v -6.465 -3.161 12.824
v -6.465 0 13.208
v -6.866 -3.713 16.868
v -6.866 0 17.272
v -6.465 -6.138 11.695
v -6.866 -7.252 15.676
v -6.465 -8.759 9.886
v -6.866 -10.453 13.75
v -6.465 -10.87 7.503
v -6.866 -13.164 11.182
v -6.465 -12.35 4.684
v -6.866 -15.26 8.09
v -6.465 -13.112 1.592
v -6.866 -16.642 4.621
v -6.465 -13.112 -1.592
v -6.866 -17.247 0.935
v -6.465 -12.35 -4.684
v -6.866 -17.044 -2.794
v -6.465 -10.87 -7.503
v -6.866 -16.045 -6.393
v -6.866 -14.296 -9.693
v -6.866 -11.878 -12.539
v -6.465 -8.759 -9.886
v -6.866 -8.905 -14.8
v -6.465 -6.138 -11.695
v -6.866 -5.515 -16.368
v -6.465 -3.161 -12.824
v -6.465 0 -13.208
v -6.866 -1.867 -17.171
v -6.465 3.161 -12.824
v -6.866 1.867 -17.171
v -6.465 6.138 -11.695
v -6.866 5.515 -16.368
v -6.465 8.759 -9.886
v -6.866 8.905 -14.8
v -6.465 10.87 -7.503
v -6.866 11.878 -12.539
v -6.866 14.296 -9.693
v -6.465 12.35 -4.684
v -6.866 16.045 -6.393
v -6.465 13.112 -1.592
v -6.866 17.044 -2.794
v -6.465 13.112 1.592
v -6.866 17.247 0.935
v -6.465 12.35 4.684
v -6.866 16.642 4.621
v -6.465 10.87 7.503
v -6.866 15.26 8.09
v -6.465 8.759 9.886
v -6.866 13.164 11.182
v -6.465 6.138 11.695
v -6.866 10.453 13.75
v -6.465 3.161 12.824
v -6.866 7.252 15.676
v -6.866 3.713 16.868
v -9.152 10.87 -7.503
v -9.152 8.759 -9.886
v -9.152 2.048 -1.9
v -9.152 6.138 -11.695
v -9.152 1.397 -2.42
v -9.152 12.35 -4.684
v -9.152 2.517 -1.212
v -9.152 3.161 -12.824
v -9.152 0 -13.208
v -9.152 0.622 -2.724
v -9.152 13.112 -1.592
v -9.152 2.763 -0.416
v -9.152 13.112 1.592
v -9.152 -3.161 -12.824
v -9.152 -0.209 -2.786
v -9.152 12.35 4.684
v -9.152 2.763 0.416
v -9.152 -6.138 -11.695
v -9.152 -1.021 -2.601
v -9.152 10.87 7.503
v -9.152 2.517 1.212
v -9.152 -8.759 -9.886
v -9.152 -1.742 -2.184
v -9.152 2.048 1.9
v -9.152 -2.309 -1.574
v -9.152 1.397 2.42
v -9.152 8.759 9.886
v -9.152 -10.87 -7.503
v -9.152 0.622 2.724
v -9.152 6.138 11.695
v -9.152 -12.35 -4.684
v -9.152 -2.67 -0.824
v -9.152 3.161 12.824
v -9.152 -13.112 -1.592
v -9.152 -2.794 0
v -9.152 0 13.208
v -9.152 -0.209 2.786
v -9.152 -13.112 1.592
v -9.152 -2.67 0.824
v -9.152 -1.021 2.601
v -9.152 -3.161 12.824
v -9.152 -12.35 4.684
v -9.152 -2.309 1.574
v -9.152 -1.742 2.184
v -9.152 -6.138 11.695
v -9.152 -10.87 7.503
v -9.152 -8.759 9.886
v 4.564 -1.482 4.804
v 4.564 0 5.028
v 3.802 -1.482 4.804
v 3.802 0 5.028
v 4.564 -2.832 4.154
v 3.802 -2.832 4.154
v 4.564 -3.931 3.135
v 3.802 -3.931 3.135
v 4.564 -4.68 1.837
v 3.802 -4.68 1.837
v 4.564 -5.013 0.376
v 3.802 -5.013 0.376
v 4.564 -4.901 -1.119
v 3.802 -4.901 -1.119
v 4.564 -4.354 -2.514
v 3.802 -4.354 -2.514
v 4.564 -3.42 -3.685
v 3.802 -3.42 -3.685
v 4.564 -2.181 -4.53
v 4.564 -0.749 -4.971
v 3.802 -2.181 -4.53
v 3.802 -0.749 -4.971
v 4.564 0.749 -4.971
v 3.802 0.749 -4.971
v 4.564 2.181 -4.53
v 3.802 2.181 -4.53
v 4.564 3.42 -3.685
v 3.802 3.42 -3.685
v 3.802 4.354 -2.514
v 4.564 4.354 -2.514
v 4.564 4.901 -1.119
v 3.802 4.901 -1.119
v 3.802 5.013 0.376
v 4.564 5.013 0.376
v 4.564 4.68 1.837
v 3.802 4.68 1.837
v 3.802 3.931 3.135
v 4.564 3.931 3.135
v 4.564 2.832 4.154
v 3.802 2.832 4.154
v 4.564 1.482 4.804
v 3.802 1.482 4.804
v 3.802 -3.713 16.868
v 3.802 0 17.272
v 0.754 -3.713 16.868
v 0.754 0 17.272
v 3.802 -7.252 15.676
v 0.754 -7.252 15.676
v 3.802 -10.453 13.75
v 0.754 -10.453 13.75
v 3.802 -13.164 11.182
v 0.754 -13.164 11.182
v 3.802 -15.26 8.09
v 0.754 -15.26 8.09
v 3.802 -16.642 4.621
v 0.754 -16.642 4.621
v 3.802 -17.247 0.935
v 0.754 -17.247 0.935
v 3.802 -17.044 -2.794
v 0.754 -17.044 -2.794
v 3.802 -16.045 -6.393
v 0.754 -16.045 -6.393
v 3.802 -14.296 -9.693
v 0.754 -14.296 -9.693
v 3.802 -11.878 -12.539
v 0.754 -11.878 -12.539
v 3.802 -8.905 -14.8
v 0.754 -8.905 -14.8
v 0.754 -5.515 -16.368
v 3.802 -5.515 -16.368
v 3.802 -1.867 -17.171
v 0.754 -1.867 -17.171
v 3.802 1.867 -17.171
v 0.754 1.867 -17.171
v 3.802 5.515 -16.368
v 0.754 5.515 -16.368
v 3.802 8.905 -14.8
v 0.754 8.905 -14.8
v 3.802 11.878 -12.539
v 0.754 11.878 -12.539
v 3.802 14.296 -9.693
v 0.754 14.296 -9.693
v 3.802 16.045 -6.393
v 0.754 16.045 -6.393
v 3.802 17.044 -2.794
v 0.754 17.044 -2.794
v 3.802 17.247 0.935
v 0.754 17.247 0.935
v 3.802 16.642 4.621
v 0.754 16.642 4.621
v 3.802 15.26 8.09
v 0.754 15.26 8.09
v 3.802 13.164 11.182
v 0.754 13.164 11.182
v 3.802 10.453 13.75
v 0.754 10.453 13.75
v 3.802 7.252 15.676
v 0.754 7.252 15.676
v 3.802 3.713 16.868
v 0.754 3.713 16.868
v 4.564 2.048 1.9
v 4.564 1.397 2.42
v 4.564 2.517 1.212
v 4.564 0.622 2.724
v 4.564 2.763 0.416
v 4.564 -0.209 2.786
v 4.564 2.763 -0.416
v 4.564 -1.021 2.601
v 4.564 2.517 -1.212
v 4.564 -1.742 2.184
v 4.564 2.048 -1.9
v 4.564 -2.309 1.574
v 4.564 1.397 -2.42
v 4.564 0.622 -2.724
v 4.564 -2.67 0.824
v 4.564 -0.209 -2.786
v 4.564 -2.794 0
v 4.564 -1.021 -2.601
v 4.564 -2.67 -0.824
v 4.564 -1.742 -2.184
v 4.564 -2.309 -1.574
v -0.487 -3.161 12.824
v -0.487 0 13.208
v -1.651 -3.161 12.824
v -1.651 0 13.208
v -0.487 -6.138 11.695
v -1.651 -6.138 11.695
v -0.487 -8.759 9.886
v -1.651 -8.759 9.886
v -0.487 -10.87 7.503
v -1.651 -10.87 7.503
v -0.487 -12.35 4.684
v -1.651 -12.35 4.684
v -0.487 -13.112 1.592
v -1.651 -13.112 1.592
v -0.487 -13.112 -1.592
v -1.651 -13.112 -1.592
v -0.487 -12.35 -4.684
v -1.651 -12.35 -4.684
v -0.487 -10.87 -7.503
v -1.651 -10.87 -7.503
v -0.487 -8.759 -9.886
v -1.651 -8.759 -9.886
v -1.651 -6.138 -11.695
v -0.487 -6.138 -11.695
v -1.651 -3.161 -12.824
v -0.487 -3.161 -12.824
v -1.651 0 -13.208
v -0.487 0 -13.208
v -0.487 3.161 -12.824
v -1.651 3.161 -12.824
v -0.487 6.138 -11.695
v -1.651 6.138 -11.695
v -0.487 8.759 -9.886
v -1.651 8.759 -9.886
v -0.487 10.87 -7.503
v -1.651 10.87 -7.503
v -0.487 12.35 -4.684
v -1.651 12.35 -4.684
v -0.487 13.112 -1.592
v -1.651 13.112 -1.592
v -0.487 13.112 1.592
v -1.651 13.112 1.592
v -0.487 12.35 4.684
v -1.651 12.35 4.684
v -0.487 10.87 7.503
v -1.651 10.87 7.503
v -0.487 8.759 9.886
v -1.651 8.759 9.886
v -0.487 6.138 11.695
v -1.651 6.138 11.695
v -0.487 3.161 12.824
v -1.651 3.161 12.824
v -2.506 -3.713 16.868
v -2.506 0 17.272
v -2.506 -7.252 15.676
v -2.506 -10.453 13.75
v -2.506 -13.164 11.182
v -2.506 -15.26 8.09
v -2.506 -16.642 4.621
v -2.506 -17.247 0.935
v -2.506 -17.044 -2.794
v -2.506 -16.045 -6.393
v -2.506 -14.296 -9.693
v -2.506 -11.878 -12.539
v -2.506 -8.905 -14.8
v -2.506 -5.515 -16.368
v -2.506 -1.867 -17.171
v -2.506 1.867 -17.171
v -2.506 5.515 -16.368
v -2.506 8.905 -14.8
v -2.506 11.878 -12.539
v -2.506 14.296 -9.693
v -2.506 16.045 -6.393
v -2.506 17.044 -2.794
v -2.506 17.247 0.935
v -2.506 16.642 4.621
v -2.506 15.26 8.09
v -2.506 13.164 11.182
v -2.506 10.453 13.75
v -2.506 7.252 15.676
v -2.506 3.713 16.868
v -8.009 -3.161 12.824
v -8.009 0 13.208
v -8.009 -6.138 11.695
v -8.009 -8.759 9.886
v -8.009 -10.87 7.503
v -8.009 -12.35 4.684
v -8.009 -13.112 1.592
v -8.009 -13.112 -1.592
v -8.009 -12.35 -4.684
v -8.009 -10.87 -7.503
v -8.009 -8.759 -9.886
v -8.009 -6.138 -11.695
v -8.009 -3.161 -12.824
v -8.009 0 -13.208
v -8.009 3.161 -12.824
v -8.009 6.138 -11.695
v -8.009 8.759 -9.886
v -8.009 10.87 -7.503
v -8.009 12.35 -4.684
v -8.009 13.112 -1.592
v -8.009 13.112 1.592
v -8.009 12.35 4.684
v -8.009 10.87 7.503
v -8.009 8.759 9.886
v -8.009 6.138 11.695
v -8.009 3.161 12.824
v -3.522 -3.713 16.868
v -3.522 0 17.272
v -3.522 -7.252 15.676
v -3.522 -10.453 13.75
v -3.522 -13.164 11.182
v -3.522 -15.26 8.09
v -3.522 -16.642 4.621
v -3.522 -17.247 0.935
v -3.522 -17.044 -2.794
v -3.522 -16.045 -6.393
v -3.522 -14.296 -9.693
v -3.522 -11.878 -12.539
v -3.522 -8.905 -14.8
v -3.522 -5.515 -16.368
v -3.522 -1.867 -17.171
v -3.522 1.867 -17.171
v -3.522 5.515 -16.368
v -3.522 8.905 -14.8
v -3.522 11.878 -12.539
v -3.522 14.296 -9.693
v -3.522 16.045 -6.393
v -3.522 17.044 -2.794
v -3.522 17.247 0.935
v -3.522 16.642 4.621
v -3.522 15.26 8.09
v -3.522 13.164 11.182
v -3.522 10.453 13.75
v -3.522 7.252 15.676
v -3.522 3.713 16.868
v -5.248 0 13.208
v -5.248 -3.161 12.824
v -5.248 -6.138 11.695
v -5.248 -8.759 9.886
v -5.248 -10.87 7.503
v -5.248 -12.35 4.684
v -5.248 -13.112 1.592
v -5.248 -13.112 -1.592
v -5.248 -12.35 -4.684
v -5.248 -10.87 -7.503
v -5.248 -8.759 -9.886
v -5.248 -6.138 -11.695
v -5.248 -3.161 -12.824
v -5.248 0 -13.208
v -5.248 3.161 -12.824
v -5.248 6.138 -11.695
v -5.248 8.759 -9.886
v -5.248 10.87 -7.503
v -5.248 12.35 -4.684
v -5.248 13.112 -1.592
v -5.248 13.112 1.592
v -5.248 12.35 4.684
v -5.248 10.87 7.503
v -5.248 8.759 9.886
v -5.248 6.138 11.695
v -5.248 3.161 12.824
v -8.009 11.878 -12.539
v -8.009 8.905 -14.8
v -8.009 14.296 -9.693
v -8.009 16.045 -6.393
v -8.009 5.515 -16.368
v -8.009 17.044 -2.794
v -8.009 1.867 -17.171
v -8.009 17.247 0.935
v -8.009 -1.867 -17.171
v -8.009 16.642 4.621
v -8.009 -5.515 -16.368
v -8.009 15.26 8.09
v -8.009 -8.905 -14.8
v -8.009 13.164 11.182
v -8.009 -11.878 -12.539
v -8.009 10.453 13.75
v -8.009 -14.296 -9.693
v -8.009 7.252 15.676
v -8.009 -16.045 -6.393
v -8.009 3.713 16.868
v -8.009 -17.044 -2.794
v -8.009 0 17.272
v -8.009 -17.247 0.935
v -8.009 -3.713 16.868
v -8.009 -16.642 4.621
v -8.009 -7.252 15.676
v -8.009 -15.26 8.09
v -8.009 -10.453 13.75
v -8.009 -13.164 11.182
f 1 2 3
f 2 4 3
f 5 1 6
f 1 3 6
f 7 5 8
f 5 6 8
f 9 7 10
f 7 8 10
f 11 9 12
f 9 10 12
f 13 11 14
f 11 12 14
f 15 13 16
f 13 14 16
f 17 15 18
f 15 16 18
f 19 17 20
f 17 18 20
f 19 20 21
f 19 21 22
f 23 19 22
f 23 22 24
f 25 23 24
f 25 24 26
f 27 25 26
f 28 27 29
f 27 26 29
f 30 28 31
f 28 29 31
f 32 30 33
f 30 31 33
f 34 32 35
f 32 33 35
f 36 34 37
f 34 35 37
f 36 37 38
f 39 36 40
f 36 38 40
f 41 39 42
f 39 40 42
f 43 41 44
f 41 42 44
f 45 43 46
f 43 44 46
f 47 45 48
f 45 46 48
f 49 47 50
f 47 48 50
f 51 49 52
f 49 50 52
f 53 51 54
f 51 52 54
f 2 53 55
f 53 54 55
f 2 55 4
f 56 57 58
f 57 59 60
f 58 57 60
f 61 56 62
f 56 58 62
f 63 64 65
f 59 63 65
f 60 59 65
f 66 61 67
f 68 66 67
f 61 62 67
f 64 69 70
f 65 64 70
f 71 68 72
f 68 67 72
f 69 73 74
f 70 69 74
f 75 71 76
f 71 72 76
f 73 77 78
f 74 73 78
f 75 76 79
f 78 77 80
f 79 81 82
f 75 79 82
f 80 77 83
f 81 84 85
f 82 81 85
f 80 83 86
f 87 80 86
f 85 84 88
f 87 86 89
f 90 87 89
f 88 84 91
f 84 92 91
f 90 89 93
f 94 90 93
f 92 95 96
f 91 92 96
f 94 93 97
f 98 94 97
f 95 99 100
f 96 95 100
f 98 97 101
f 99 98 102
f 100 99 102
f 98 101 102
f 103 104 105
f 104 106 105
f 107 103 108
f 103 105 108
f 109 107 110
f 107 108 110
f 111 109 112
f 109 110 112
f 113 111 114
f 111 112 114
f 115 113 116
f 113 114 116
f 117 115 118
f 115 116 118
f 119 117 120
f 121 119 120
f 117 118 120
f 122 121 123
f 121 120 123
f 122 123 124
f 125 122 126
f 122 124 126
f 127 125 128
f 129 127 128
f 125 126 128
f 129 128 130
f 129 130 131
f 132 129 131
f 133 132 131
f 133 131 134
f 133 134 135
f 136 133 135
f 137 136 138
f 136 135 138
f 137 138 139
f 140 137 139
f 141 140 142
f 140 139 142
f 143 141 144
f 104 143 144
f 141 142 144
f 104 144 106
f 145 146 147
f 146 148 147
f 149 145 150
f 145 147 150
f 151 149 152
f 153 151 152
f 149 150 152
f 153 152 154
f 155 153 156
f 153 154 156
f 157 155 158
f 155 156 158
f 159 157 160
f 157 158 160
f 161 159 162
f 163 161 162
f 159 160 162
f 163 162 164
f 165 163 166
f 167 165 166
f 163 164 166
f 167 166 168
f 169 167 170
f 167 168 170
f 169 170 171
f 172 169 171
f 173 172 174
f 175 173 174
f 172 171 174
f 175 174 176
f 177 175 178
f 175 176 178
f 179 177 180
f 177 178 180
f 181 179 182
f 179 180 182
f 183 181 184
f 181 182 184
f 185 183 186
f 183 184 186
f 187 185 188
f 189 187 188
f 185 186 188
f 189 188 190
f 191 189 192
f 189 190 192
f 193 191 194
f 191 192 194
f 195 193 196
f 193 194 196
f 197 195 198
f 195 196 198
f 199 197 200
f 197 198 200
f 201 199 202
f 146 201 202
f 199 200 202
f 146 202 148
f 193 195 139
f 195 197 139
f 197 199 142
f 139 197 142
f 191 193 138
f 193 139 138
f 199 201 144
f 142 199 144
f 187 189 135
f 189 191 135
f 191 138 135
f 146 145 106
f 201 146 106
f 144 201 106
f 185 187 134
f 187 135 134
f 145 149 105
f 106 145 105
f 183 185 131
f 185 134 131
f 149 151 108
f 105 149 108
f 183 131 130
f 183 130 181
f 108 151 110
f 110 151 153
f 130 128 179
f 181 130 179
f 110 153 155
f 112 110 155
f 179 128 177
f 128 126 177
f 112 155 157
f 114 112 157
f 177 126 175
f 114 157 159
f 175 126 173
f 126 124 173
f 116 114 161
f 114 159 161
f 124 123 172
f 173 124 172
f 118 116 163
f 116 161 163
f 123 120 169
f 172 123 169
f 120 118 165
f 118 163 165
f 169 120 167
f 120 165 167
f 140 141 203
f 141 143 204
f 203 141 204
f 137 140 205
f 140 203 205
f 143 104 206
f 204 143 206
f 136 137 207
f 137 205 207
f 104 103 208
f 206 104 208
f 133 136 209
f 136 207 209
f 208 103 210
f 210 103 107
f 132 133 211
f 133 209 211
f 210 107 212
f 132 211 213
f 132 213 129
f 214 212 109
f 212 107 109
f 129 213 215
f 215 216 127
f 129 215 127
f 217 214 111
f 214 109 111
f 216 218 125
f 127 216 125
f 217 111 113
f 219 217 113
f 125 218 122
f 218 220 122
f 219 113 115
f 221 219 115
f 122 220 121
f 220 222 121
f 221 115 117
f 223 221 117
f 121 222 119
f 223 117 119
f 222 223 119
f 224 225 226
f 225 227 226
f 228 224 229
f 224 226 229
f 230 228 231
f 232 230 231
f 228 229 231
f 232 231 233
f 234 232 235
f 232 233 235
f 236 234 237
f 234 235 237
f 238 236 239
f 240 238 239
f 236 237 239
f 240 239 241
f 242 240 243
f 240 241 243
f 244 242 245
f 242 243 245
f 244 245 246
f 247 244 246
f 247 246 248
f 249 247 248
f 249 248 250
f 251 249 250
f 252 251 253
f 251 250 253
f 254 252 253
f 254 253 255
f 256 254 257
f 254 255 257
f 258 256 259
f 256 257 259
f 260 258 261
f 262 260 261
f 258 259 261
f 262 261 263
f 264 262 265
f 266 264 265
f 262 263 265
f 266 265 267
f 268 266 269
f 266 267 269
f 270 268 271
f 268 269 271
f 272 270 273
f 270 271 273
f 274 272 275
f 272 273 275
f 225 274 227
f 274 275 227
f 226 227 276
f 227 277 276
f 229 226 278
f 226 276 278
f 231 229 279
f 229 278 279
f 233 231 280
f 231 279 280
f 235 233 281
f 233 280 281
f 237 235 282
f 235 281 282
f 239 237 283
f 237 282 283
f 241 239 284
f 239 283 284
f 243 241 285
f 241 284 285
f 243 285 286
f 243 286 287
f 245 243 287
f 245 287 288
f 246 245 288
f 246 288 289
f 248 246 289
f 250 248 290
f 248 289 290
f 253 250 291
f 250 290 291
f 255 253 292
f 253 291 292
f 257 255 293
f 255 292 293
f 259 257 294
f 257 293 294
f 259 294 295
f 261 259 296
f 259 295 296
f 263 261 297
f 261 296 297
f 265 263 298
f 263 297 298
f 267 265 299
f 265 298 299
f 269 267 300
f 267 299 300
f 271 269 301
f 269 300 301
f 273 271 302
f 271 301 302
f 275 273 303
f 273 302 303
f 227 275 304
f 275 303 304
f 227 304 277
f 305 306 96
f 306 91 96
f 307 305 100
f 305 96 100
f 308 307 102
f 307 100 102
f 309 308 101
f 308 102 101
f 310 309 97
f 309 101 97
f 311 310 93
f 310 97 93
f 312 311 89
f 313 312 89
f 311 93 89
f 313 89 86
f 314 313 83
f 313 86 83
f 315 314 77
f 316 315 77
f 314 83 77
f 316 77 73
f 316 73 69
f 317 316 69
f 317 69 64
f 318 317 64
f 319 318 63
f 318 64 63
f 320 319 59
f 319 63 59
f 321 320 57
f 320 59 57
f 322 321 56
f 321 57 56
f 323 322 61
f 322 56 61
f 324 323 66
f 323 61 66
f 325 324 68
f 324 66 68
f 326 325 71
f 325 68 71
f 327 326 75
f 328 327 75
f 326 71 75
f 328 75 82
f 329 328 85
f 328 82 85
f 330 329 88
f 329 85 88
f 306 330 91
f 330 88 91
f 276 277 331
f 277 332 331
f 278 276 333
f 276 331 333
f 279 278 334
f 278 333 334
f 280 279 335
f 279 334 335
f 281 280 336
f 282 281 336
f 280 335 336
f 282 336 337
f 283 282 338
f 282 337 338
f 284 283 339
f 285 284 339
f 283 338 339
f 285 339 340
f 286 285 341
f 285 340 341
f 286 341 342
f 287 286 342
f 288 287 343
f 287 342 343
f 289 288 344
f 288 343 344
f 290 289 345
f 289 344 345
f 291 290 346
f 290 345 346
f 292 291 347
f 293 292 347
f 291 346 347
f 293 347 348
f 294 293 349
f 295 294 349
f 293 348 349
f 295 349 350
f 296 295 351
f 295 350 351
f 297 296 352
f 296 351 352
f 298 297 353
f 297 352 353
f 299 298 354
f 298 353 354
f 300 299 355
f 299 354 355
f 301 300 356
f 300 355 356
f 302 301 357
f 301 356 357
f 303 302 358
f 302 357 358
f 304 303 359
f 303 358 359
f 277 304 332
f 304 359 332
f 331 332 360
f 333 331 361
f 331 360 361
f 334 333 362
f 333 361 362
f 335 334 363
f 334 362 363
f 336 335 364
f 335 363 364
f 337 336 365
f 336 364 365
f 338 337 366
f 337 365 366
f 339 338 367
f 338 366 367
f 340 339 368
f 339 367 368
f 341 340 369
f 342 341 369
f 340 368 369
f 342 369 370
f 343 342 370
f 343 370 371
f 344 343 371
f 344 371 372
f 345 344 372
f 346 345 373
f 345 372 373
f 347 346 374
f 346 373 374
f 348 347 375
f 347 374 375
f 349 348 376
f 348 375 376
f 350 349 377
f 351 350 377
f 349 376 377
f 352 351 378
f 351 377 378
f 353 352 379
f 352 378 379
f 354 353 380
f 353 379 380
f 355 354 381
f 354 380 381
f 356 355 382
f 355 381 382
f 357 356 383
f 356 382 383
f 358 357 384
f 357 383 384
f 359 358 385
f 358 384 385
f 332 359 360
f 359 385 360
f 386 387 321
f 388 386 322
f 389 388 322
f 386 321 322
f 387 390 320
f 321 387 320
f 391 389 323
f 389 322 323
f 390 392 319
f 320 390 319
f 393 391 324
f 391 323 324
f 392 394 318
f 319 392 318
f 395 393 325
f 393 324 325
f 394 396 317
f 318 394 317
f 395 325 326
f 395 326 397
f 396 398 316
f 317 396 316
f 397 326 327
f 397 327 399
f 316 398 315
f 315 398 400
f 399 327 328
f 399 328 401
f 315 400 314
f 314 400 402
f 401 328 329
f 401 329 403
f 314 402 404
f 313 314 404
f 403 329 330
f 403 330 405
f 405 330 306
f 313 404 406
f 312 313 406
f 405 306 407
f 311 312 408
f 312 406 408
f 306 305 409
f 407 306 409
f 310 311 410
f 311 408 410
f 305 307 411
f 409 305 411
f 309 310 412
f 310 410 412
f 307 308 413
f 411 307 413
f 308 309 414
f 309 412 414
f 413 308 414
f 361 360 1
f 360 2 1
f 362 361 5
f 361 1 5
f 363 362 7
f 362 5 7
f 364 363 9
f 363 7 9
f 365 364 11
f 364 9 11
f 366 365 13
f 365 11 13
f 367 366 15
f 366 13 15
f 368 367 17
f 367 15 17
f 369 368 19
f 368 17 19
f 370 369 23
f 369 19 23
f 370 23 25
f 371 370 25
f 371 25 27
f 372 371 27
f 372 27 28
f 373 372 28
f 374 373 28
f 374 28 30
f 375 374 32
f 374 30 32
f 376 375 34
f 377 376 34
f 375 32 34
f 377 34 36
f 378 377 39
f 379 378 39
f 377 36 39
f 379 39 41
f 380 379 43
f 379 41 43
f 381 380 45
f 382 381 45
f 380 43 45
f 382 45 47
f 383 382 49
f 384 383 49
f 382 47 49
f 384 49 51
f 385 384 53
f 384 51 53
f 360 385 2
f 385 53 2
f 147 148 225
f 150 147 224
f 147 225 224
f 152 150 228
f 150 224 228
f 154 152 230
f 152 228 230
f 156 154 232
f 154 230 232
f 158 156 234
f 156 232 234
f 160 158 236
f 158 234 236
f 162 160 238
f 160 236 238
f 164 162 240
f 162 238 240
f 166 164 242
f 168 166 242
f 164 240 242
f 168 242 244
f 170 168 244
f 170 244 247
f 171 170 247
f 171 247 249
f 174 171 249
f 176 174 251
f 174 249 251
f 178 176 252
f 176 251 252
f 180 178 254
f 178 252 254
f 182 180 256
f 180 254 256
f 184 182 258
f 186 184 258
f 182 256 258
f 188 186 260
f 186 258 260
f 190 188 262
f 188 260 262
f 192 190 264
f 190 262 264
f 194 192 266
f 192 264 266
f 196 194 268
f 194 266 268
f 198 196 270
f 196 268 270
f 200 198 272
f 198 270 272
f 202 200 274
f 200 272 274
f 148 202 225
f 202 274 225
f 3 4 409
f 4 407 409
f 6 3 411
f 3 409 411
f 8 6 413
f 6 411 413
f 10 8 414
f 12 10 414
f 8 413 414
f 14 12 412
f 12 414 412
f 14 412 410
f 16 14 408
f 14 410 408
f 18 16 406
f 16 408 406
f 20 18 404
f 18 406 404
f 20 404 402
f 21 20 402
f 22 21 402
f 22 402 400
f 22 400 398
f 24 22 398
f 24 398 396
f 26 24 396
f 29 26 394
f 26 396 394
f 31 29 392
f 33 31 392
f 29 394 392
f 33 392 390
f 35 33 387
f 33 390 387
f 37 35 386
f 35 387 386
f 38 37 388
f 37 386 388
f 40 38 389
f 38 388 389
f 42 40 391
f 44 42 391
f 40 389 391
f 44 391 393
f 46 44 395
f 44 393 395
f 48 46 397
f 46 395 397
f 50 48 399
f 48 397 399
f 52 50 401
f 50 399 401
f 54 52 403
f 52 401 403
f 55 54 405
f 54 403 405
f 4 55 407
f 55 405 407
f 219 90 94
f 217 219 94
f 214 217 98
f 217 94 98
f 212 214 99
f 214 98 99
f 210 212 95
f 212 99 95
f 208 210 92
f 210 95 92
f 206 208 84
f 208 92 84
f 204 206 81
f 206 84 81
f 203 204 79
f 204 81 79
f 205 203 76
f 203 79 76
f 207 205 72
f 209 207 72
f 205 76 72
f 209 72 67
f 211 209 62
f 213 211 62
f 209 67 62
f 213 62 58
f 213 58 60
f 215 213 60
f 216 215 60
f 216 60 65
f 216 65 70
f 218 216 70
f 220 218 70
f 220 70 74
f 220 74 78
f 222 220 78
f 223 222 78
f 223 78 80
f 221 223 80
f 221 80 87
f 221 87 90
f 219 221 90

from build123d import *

# Parameters (mm, degrees)
F3_D = 5.588


with BuildPart() as f1:
    # F0 (on Front) → F1 (revolve)
    with BuildSketch(Plane.XZ):
        Polygon((-9.15198, 13.208), (-9.15198, 0), (4.56402, 0), (4.56402, 5.027528), (3.80202, 5.027528), (3.80202, 17.272), (0.75402, 17.272), (-0.486955, 13.208), (-1.650846, 13.208), (-2.506008, 17.272), (-3.522008, 17.272), (-5.248328, 13.208), (-6.465123, 13.208), (-6.86598, 17.272), (-8.00898, 17.272), (-8.00898, 13.208), align=None)
    revolve(axis=Axis((-2.29398, 0, 0), (1, 0, 0)))

    # F3 (through all)
    with Locations(Plane.YZ.offset(4.56402)):
        with Locations((0, 0)):
            Hole(F3_D / 2)


solid = f1.part
